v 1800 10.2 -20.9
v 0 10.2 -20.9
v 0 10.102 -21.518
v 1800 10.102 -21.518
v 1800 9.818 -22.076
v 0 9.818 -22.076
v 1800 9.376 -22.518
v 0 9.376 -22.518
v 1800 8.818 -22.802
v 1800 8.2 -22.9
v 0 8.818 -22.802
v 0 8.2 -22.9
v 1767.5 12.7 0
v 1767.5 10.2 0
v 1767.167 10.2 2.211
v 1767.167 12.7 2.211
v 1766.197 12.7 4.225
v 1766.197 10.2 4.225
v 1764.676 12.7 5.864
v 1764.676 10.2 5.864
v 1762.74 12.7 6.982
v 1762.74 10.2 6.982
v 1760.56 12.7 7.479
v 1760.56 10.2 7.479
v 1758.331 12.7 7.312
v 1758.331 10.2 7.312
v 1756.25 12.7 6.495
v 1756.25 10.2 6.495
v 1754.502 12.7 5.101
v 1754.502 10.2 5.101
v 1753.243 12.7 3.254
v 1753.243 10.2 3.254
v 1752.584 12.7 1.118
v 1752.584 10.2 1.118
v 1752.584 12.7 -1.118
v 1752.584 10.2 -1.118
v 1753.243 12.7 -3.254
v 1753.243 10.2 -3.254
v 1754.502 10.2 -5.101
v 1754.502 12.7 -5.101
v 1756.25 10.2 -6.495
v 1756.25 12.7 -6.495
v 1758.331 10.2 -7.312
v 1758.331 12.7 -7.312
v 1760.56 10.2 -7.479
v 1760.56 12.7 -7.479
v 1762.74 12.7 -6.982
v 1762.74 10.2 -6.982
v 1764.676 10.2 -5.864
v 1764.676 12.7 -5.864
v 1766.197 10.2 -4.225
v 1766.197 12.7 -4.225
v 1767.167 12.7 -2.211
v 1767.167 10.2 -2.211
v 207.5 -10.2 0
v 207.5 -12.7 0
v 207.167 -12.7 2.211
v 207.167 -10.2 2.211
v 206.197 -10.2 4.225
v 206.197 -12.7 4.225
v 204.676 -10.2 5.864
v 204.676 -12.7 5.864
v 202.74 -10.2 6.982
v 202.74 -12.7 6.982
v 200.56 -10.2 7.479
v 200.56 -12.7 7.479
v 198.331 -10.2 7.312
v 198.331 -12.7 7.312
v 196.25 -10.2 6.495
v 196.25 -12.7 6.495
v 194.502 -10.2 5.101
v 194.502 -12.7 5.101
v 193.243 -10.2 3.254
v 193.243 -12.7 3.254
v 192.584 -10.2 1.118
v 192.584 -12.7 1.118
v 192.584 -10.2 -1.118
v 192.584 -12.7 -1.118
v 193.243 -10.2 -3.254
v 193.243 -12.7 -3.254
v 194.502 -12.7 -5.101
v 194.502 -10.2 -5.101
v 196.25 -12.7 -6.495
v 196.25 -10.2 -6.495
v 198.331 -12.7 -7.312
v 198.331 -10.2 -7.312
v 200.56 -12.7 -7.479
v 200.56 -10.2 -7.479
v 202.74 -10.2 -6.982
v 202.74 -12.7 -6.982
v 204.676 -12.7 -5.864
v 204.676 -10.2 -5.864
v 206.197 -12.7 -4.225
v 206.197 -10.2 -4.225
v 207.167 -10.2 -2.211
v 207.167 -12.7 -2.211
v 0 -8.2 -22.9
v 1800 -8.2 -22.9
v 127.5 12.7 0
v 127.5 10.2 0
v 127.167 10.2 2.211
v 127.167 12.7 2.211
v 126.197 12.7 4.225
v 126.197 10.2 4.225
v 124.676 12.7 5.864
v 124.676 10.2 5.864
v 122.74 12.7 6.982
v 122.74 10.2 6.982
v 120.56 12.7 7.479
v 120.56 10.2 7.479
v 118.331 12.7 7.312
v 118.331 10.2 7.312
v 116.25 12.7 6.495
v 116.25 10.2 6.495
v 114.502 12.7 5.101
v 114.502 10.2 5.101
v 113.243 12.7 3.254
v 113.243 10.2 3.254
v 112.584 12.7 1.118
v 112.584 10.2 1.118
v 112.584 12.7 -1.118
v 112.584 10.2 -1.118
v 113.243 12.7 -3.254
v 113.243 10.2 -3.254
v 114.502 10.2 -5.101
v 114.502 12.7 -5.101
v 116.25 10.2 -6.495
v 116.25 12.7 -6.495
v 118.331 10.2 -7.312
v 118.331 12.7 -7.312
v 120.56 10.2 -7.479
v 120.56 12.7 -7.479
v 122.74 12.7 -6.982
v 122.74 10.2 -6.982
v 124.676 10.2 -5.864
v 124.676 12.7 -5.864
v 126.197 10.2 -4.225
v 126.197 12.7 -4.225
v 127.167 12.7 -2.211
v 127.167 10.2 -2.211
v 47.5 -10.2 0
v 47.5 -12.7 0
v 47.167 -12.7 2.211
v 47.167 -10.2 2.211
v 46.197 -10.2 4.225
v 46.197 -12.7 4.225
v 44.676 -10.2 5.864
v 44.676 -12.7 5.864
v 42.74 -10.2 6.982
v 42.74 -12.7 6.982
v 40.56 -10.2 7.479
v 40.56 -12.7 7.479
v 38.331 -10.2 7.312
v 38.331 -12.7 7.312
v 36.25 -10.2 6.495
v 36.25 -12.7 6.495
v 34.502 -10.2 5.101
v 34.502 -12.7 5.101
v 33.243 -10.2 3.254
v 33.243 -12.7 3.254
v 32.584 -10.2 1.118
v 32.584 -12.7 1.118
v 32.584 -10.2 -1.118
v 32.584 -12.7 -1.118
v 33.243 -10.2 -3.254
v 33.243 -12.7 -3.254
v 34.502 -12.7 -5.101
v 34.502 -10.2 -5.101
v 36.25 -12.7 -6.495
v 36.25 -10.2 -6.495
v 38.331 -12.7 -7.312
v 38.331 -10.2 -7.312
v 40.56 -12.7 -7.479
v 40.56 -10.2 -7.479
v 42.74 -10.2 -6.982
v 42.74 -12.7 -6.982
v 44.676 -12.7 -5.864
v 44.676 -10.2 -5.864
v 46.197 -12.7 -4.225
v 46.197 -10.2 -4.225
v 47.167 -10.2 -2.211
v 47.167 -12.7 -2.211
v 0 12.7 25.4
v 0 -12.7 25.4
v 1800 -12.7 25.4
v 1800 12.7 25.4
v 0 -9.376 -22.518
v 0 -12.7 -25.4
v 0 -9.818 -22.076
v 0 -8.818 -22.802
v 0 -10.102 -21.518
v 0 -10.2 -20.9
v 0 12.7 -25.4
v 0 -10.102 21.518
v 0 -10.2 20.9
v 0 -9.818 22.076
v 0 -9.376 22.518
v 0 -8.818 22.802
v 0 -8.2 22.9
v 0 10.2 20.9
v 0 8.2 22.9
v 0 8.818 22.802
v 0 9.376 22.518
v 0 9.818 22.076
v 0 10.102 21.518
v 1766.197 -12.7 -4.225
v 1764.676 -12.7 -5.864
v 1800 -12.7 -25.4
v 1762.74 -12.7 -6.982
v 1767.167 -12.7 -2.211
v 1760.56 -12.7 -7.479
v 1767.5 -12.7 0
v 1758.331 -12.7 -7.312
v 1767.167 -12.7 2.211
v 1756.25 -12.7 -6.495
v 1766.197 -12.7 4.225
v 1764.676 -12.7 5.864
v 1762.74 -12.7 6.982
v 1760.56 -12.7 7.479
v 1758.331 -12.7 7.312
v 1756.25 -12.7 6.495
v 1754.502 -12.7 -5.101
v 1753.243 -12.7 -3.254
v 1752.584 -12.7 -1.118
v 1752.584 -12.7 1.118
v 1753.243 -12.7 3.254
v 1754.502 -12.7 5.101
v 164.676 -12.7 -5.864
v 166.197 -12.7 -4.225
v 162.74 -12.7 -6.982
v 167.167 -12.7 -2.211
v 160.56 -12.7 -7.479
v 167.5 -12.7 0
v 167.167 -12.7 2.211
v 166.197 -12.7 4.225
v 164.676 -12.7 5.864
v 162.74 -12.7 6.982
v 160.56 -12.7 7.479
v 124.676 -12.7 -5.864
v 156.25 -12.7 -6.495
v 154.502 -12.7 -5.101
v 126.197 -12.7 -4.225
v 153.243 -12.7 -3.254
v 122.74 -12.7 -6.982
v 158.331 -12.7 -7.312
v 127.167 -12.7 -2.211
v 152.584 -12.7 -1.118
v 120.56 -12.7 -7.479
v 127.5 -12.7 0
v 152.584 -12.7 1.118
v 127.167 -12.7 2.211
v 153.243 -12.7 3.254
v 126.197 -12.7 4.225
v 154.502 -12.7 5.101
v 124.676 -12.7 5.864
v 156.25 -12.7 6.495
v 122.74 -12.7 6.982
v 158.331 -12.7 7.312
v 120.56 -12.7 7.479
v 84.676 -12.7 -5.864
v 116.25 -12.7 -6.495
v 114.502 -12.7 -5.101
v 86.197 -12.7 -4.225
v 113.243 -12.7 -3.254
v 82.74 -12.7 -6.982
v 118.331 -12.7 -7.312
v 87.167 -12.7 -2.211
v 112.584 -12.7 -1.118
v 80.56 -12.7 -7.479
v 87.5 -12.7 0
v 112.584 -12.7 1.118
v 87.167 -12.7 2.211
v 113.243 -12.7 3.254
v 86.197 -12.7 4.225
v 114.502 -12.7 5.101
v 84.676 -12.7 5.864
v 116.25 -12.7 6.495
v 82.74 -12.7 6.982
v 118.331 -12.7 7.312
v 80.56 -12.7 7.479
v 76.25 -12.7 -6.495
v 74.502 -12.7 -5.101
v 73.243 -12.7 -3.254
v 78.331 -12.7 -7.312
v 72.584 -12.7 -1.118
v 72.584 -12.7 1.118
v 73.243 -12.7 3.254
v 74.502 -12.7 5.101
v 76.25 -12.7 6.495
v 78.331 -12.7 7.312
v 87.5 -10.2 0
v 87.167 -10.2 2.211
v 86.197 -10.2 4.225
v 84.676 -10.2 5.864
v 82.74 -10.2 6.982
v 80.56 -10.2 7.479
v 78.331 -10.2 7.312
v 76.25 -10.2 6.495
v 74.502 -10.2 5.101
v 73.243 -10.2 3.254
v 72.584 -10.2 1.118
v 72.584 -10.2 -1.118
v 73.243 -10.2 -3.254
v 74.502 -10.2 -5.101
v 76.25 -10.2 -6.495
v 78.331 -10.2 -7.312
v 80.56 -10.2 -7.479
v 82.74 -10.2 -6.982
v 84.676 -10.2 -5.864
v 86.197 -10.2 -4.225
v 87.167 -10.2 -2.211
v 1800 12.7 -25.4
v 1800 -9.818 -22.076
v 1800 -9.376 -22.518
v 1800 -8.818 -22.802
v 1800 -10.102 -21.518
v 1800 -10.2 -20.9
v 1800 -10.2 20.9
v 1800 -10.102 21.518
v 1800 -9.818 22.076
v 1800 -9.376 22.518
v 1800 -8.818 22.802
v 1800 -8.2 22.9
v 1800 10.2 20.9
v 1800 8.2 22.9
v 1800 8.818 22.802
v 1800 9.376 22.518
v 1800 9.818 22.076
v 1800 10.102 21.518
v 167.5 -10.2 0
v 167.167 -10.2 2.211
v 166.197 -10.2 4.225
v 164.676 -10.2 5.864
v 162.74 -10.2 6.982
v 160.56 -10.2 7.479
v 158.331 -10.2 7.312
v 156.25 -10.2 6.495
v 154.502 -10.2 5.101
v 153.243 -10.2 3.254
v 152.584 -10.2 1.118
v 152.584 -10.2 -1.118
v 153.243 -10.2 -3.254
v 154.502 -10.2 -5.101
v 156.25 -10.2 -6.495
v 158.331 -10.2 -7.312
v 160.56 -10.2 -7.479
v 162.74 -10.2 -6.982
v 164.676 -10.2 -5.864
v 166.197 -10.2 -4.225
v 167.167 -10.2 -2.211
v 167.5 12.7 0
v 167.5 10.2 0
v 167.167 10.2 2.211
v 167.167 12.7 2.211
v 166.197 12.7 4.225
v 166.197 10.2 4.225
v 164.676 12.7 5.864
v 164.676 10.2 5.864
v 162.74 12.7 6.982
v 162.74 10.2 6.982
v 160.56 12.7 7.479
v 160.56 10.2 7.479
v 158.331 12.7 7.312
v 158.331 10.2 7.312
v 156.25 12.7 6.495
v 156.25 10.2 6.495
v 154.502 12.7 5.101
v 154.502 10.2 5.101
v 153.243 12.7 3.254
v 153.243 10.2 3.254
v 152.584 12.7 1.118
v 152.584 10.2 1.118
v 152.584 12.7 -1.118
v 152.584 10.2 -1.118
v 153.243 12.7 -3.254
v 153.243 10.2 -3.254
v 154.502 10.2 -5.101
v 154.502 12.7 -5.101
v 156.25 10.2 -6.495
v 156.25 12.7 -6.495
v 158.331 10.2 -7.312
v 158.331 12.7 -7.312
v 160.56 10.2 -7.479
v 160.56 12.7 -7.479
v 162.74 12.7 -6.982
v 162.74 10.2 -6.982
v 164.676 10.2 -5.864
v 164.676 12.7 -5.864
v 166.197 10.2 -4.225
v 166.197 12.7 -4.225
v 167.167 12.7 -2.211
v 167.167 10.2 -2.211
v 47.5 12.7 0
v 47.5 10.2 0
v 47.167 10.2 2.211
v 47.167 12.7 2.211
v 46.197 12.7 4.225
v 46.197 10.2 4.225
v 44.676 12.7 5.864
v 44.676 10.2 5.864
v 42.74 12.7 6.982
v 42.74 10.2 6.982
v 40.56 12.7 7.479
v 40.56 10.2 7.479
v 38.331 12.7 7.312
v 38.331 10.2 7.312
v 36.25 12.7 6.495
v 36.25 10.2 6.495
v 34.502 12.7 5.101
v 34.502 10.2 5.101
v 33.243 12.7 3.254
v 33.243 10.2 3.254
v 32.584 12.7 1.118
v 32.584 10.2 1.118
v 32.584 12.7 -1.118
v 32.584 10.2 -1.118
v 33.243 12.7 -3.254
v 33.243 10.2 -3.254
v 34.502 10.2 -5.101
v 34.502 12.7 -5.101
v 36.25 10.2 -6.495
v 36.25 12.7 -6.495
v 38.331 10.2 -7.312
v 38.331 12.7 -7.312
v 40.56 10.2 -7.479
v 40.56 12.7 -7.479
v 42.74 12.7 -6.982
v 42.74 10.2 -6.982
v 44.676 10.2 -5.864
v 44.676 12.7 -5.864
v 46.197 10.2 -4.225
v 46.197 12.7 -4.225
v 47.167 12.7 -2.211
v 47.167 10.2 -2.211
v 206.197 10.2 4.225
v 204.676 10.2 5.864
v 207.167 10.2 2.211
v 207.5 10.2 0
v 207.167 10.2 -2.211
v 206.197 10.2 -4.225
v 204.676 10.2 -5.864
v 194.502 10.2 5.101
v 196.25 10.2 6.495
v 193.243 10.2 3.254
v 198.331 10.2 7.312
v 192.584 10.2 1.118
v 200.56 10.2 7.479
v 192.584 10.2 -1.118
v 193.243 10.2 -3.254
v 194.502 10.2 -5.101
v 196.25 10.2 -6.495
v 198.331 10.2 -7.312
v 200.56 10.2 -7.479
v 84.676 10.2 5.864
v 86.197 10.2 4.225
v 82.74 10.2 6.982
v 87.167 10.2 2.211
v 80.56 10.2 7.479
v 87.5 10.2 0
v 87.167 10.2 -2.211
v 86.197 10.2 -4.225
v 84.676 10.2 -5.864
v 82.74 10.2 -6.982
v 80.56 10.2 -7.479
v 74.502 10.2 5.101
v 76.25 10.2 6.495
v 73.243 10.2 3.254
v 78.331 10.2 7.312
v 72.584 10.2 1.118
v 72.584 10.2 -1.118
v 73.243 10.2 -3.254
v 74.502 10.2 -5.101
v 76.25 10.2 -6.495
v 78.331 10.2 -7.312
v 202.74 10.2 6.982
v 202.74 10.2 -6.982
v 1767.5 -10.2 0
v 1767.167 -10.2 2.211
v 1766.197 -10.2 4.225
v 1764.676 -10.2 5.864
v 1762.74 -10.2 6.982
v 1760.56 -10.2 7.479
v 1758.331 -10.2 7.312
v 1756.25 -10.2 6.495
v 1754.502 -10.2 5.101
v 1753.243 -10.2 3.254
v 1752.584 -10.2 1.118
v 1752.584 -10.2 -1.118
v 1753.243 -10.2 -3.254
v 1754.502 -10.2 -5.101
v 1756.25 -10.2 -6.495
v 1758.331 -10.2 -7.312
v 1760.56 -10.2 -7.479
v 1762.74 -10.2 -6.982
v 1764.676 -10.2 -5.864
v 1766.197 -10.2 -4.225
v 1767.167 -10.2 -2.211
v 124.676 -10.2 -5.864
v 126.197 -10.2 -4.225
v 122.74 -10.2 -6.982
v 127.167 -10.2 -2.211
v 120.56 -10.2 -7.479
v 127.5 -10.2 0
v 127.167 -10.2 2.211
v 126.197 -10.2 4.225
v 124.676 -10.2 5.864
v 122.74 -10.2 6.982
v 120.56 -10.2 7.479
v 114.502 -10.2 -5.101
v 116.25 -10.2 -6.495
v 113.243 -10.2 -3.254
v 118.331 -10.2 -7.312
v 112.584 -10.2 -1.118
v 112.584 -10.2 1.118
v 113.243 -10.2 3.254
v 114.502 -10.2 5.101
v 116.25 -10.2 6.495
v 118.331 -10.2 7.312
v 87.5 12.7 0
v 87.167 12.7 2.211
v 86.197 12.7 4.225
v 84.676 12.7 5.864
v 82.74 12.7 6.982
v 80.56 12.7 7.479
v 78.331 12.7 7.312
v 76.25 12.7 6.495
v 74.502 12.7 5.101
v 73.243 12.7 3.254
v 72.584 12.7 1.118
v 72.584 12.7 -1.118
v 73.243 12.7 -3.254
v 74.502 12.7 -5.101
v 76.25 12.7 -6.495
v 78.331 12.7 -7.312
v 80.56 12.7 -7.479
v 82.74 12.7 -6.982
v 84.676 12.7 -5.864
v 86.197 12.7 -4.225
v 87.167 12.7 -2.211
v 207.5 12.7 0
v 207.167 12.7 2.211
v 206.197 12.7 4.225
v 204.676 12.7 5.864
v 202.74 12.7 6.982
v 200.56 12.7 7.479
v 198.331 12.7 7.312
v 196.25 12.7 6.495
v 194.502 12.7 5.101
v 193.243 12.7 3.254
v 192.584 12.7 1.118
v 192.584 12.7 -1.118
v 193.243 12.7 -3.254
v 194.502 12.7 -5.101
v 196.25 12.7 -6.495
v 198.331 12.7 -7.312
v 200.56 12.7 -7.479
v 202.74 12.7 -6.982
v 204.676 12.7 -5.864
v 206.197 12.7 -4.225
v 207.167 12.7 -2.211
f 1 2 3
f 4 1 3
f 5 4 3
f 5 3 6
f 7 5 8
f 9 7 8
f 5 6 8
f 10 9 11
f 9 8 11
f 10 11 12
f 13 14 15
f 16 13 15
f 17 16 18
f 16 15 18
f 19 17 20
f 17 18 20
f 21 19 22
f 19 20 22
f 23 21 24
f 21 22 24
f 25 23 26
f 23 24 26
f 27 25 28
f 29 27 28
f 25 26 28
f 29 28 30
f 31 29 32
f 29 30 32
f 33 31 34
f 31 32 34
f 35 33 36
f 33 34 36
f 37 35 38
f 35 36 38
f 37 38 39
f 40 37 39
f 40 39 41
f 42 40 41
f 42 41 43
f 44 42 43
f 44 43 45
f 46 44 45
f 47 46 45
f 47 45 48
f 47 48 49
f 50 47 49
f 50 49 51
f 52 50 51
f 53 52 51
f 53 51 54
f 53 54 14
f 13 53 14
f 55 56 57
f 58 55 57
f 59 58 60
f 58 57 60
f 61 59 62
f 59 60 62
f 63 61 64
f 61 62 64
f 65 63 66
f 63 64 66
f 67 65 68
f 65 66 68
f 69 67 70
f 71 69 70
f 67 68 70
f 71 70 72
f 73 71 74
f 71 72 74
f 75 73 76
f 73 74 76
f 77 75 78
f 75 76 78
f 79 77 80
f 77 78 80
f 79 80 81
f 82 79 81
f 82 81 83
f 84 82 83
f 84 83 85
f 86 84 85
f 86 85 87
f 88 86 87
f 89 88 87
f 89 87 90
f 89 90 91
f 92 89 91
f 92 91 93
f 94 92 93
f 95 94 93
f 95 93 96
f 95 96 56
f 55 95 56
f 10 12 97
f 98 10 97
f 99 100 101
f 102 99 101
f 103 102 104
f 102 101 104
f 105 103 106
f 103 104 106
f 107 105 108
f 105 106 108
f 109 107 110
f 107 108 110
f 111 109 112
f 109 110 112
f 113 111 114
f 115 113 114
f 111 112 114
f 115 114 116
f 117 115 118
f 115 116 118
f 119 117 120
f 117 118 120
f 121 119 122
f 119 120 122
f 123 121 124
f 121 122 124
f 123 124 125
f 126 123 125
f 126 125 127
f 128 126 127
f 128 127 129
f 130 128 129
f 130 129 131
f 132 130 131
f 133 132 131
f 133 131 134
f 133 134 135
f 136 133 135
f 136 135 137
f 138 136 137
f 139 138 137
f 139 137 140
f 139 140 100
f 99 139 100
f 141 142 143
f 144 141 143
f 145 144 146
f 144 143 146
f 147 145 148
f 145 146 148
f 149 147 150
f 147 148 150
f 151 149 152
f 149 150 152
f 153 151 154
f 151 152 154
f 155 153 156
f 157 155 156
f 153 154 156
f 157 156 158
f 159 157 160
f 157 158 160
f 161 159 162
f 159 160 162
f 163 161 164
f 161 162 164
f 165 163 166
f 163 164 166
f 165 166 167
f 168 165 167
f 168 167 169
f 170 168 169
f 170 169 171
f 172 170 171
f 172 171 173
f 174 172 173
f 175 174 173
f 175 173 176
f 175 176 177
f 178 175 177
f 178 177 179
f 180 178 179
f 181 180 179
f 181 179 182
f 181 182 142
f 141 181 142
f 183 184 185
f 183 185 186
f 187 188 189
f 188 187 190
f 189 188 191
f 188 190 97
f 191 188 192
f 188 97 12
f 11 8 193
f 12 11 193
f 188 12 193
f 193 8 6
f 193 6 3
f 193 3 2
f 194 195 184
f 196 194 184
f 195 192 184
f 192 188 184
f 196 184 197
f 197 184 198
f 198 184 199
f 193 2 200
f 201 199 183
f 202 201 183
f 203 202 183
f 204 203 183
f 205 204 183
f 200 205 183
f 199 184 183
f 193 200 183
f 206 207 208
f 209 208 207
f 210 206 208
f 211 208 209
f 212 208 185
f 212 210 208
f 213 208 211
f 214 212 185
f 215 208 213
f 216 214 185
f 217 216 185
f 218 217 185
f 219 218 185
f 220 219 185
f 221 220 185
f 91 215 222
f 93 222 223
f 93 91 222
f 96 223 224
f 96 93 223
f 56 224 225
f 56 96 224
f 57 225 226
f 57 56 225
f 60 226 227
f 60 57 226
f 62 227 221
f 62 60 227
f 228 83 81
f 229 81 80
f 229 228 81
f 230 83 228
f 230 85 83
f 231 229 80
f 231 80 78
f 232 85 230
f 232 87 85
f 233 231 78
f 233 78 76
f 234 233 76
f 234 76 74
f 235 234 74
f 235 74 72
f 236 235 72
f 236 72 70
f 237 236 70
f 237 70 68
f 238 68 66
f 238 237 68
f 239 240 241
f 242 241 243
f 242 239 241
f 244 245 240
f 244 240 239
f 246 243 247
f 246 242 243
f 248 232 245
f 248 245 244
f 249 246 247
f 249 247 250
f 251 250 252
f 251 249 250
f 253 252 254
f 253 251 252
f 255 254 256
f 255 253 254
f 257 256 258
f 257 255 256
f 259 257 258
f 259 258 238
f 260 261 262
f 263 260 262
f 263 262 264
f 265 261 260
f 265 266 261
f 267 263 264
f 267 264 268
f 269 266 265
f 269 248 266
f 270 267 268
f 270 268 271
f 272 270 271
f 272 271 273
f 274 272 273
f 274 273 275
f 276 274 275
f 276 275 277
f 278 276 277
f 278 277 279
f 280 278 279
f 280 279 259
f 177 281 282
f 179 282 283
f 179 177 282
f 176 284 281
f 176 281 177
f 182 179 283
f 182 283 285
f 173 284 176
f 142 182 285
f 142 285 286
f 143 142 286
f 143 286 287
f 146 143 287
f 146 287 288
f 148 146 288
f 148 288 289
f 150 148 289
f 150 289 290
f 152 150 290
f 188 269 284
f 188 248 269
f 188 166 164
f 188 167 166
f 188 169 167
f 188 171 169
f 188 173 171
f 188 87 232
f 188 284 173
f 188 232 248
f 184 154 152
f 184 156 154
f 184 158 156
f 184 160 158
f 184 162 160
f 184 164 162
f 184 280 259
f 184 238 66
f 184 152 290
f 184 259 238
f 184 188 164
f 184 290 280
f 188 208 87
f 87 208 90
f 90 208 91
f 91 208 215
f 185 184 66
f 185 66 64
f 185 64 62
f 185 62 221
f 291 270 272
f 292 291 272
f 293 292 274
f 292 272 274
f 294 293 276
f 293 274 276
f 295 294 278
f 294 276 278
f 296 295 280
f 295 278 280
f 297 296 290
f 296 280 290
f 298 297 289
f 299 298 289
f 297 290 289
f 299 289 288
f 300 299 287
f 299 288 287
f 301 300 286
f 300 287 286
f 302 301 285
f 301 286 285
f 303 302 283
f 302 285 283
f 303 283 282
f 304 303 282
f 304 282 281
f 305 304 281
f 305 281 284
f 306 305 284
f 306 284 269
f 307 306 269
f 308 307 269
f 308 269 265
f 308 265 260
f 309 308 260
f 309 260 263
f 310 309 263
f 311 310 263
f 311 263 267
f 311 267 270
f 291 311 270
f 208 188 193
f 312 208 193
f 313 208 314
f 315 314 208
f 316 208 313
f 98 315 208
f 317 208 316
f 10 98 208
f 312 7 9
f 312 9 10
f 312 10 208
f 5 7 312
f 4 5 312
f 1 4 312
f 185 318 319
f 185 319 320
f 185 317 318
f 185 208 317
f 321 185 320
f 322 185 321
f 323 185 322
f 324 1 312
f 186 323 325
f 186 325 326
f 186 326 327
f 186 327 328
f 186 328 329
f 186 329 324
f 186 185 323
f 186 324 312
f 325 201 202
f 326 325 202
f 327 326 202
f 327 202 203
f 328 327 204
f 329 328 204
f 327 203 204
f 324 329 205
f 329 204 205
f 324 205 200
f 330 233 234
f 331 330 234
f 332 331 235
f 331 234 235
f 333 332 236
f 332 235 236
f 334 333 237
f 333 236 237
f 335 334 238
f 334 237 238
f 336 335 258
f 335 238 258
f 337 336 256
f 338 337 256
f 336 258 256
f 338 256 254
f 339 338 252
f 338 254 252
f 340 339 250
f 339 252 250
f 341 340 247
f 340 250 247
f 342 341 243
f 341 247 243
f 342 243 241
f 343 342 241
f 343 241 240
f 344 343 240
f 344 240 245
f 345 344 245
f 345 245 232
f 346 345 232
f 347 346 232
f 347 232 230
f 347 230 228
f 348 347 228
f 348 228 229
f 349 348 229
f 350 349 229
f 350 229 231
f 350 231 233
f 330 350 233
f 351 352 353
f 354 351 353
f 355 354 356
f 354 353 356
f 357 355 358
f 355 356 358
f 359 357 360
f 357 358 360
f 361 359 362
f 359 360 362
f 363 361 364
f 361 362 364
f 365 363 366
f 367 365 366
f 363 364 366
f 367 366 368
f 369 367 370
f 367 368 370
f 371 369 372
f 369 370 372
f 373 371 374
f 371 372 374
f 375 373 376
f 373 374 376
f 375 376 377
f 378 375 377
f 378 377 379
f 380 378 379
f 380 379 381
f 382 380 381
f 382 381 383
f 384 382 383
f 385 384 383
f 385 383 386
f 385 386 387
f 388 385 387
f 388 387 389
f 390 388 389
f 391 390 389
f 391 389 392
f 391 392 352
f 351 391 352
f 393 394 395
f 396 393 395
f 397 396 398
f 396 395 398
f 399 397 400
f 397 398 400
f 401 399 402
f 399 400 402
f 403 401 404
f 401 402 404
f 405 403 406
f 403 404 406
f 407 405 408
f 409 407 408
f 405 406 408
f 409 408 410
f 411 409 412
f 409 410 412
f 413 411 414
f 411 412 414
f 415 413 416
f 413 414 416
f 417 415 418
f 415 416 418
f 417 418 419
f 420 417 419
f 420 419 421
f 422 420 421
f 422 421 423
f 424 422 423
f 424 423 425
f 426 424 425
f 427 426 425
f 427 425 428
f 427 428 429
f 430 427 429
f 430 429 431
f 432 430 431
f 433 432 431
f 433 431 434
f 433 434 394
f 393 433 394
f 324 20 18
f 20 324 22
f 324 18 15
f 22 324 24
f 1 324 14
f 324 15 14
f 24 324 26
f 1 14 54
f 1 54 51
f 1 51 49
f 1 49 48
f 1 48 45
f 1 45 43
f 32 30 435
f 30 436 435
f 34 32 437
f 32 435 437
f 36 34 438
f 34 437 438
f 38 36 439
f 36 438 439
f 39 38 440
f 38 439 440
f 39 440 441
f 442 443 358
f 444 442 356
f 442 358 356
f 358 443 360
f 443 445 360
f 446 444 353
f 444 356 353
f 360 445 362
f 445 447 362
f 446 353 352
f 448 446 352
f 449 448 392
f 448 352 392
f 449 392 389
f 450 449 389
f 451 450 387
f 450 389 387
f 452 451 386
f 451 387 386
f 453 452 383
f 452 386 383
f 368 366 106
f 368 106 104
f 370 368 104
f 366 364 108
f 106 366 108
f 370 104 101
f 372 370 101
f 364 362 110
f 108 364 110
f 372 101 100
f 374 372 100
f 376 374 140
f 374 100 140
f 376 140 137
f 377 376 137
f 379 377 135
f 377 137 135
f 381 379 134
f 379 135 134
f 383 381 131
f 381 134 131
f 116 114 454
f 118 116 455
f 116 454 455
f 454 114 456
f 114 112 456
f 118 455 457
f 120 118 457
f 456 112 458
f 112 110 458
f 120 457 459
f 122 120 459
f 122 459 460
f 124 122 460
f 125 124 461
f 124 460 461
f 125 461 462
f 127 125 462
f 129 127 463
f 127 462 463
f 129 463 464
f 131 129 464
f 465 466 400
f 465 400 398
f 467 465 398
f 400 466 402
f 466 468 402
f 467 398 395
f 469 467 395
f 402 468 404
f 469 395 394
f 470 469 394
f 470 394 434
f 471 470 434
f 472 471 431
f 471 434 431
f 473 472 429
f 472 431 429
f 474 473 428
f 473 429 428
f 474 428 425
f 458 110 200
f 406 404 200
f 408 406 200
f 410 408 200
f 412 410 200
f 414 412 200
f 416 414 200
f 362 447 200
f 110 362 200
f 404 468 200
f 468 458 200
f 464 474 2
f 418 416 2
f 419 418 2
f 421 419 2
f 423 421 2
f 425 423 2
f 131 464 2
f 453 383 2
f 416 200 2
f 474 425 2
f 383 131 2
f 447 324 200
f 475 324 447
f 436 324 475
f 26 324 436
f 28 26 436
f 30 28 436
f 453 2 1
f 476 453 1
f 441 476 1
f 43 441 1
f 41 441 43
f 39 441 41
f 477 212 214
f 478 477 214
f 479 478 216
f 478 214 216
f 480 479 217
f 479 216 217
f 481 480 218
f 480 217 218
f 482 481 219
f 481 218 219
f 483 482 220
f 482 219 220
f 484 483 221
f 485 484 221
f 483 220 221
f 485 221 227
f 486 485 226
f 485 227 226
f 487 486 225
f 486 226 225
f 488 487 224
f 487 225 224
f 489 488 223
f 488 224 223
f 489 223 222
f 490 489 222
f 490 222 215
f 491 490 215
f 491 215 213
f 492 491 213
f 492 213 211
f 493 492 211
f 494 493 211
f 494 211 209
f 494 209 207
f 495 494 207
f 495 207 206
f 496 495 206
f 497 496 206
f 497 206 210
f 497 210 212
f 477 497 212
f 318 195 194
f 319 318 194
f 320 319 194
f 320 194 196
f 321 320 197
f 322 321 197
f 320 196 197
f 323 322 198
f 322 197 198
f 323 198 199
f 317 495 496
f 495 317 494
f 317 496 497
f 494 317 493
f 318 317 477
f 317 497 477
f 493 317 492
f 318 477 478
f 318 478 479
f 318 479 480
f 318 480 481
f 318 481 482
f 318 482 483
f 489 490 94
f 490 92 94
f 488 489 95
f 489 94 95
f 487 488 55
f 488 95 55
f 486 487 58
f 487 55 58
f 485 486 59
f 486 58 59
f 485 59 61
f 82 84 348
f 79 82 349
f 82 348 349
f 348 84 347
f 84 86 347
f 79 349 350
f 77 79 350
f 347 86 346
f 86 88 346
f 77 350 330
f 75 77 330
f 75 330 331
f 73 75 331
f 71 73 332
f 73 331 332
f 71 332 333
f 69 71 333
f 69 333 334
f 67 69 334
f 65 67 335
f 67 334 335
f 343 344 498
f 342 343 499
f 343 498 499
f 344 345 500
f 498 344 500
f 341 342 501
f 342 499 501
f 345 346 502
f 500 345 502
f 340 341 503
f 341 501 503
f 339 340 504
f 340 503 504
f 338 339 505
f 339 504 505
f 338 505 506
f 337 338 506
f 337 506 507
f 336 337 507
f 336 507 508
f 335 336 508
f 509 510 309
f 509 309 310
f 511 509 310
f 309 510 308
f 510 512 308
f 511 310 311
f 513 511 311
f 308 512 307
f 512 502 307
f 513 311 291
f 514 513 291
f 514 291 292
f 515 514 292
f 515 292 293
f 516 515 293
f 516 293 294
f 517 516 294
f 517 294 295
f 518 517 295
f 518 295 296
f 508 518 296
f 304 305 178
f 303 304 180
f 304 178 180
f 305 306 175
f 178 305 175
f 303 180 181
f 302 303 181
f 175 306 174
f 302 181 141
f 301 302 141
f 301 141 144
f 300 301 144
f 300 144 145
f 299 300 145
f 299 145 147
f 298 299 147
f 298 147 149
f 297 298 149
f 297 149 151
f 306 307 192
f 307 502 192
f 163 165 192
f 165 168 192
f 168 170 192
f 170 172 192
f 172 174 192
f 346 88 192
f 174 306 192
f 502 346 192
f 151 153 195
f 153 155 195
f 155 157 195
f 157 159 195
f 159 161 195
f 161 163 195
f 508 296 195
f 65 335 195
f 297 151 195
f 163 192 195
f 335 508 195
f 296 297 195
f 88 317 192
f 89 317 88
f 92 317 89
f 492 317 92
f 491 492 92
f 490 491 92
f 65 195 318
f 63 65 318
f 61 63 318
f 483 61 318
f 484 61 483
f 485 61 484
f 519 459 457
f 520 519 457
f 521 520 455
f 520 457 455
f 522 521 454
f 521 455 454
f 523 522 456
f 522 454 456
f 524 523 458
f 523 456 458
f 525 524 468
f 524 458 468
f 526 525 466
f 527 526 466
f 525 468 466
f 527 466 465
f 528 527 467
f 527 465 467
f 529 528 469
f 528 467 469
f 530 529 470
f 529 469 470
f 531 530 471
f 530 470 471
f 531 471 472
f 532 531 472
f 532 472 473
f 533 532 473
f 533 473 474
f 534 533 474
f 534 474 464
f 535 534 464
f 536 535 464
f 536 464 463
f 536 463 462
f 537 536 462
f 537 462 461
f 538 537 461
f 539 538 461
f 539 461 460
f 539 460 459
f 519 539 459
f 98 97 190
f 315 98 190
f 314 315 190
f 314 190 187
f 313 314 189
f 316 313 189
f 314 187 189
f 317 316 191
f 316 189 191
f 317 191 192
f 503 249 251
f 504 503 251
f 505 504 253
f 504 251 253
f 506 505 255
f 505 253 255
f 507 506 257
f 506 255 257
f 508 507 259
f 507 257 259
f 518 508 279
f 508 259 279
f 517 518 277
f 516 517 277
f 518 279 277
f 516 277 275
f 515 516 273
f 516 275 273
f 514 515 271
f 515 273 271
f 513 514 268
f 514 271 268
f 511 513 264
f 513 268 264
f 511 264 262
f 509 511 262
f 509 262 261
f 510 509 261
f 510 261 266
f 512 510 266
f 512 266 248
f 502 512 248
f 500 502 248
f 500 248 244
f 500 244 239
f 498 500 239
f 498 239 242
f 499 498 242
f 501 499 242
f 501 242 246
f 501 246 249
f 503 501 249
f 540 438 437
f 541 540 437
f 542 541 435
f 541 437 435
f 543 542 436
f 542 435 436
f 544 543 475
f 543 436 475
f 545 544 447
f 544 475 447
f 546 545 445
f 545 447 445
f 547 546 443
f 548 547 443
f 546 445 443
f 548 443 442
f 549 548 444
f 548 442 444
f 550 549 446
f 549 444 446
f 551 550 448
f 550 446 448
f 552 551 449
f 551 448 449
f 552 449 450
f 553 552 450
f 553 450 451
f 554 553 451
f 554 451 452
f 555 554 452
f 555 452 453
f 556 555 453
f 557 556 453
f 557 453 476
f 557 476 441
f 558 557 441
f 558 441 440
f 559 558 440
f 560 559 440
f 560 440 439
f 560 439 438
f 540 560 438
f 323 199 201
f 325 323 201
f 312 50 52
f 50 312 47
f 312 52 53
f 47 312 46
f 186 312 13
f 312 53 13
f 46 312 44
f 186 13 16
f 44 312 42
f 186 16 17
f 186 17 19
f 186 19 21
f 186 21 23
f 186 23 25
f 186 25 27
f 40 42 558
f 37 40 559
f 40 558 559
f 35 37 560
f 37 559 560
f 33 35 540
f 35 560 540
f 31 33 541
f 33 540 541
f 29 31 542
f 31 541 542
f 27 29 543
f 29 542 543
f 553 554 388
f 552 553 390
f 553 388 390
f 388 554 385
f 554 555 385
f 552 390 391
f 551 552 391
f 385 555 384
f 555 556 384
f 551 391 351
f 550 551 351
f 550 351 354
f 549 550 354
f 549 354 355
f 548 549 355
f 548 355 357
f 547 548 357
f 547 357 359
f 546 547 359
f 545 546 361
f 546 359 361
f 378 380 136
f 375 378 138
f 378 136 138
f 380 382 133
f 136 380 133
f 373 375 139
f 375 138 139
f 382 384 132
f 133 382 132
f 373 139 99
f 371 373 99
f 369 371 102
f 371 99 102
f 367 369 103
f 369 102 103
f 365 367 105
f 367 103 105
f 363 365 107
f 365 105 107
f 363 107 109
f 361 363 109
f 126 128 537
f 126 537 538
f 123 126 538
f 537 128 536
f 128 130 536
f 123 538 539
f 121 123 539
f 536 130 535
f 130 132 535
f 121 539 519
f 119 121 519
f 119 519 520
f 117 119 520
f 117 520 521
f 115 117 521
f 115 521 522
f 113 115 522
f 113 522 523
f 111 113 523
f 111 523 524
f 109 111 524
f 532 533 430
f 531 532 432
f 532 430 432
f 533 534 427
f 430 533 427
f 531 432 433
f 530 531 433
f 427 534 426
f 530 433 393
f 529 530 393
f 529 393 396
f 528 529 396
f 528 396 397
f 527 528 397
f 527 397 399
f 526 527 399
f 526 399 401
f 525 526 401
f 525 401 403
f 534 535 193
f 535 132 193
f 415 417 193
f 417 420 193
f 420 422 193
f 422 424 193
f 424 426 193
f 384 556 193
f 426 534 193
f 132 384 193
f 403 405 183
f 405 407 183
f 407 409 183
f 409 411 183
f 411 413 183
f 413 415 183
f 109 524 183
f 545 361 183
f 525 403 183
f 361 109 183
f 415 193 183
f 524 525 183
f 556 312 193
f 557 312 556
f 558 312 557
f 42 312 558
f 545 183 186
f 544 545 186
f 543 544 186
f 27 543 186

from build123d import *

# Parameters (mm, degrees)
F0_W     = 25.4
F0_H     = 50.8
F1_DEPTH = 1800
F2_R     = 7.5
F3_DEPTH = 25.4
F4_R     = 7.5
F5_DEPTH = 25.4


with BuildPart() as f1:
    # F0 (on Right) → F1 (new body)
    with BuildSketch(Plane.YZ):
        Rectangle(F0_W, F0_H)
        with BuildLine():
            Line((-8.2, 22.9), (8.2, 22.9))
            ThreePointArc((8.2, 22.9), (9.614214, 22.314214), (10.2, 20.9))
            Line((10.2, 20.9), (10.2, -20.9))
            ThreePointArc((10.2, -20.9), (9.614214, -22.314214), (8.2, -22.9))
            Line((8.2, -22.9), (-8.2, -22.9))
            ThreePointArc((-8.2, -22.9), (-9.614214, -22.314214), (-10.2, -20.9))
            Line((-10.2, -20.9), (-10.2, 20.9))
            ThreePointArc((-10.2, 20.9), (-9.614214, 22.314214), (-8.2, 22.9))
        make_face(mode=Mode.SUBTRACT)
    extrude(amount=F1_DEPTH)

    # F2 (on face) → F3 (cut, through all)
    with BuildSketch(Plane.XZ.offset(12.7)):
        with Locations((1760, 0)):
            Circle(F2_R)
    extrude(amount=-F3_DEPTH, mode=Mode.SUBTRACT)

    # F4 (on face) → F5 (cut, through all)
    with BuildSketch(Plane.XZ.offset(12.7)):
        with Locations((40, 0)):
            Circle(F4_R)
        with Locations((80, 0)):
            Circle(F4_R)
        with Locations((120, 0)):
            Circle(F4_R)
        with Locations((160, 0)):
            Circle(F4_R)
        with Locations((200, 0)):
            Circle(F4_R)
    extrude(amount=-F5_DEPTH, mode=Mode.SUBTRACT)


solid = f1.part
